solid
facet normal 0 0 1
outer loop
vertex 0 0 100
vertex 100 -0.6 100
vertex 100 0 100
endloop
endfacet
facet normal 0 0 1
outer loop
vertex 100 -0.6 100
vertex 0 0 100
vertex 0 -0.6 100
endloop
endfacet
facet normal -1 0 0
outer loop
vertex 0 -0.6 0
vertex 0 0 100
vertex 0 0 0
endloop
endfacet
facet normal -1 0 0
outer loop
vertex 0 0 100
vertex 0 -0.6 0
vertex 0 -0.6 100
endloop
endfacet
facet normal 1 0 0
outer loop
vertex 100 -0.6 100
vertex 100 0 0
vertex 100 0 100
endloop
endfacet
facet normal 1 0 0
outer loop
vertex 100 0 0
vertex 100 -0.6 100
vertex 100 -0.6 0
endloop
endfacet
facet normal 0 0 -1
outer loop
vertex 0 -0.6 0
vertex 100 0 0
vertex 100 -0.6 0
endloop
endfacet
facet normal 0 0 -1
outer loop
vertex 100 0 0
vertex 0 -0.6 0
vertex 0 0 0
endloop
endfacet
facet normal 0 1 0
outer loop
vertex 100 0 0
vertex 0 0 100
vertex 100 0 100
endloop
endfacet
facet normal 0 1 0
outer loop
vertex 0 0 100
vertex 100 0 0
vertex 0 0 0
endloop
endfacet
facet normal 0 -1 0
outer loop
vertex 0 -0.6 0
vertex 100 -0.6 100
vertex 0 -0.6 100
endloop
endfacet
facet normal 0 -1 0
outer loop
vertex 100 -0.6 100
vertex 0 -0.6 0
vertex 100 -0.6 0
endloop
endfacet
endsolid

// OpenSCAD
w2 = 2.5;
h = 2;
in = 0;

module a(){
linear_extrude(100)
for(i = [0:20]){
  translate([i * (w2 * 2 - in) ,0,0])
  polygon([[-w2,0],[0,h],[w2,0]]);
}
}


module b(){

difference(){
a();
translate([40*w2, h  ,40*w2])
rotate([0,90,180])
a();
}
}

difference(){
union(){
b();
translate([0,-.6,0])
cube([40*w2, .6  ,40*w2]);
}

translate([0,-.6,0])
b();

}
